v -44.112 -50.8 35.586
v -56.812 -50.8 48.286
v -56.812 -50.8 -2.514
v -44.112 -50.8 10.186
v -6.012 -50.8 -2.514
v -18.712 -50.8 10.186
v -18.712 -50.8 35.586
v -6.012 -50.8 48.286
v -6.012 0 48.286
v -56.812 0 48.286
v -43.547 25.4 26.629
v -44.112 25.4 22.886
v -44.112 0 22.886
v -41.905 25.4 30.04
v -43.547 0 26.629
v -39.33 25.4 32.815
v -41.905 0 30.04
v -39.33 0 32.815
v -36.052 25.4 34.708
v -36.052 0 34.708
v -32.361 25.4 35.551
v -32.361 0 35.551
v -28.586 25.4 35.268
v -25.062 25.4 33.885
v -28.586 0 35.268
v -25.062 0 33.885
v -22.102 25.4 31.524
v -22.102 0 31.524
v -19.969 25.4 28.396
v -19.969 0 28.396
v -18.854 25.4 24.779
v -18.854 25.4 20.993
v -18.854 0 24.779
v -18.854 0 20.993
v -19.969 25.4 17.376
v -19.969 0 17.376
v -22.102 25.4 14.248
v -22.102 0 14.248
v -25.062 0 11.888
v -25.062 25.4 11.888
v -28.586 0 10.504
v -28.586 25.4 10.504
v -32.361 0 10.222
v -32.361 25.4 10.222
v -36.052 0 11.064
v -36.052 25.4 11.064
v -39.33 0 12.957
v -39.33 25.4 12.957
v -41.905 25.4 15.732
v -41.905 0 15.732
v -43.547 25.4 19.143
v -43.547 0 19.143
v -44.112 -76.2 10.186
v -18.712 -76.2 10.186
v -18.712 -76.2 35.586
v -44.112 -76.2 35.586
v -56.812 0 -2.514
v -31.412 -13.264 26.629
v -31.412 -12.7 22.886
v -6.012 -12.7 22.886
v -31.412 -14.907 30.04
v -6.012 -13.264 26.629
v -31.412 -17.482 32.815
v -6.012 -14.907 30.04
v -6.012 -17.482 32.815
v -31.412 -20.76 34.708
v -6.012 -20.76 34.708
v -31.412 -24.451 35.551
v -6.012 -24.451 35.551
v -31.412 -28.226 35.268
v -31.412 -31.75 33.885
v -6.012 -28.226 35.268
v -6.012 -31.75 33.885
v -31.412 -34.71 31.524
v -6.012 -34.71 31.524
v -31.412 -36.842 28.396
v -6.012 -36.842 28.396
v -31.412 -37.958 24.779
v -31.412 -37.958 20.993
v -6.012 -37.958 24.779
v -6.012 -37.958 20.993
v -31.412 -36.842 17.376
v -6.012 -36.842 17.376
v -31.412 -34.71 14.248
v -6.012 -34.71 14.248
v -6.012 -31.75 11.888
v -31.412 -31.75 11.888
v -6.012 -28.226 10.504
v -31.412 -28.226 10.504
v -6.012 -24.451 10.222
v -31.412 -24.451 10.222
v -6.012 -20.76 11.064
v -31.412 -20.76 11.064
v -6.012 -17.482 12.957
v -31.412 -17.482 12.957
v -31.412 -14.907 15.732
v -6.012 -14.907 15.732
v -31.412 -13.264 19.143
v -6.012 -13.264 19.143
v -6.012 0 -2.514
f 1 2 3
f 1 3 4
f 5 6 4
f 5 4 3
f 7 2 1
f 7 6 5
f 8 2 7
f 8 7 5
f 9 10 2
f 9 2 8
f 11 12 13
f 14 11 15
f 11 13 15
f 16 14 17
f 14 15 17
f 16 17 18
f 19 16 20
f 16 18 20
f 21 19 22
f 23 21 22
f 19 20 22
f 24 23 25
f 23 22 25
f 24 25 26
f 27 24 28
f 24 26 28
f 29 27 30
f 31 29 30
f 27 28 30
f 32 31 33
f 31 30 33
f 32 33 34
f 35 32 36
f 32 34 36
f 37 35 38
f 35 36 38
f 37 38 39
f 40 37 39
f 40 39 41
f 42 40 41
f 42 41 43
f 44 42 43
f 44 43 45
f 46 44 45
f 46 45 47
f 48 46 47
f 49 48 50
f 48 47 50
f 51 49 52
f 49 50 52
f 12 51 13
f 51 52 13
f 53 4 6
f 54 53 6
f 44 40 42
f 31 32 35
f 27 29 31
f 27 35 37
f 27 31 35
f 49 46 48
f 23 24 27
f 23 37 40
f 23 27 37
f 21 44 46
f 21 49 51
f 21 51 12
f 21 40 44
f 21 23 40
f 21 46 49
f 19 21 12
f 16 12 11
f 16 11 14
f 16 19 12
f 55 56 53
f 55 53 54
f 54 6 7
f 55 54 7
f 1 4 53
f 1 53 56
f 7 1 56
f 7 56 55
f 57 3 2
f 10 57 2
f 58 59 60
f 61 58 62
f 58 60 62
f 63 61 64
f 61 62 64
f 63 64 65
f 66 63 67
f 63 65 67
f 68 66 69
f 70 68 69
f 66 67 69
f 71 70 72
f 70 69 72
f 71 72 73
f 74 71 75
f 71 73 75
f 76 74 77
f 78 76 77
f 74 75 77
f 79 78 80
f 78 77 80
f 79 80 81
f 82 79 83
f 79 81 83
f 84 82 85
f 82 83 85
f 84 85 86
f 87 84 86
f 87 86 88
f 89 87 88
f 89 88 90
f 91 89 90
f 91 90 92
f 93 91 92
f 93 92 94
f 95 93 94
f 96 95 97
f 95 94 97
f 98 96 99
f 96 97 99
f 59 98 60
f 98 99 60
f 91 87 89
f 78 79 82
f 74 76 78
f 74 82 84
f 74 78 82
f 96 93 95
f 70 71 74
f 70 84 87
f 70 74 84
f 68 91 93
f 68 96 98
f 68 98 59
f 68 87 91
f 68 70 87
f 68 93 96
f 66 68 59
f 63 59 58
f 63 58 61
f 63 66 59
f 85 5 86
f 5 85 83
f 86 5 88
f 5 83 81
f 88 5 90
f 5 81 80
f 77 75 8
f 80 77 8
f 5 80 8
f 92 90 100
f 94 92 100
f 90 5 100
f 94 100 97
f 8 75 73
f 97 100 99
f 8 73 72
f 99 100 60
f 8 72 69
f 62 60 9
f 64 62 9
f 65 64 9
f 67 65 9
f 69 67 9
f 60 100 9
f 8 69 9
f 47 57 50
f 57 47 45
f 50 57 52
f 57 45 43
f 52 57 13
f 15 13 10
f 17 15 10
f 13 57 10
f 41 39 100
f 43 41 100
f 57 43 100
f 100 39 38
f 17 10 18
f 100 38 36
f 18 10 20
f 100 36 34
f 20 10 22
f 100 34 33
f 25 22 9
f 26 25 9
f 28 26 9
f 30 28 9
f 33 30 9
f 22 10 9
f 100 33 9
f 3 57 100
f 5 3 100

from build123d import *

# Parameters (mm, degrees)
F0_W     = 50.8
F0_H     = 50.8
F1_DEPTH = 50.8
F2_W     = 25.4
F2_H     = 25.4
F3_DEPTH = 25.4
F4_R     = 12.7
F5_DEPTH = 25.4
F6_R     = 12.7
F7_DEPTH = 25.4


with BuildPart() as f1:
    # F0 (on Front) → F1 (new body)
    with BuildSketch(Plane.XZ):
        with Locations((-31.411681, 22.886025)):
            Rectangle(F0_W, F0_H)
    extrude(amount=F1_DEPTH)

    # F2 (on face) → F3 (join)
    with BuildSketch(Plane.XZ.offset(50.8)):
        with Locations((-31.411681, 22.886025)):
            Rectangle(F2_W, F2_H)
    extrude(amount=F3_DEPTH)

    # F4 (on face) → F5 (cut)
    with BuildSketch(Plane.YZ.offset(-6.011681)):
        with Locations((-25.4, 22.886025)):
            Circle(F4_R)
    extrude(amount=-F5_DEPTH, mode=Mode.SUBTRACT)

    # F6 (on face) → F7 (join)
    with BuildSketch(Plane(origin=(0, 0, 0), x_dir=(-1, 0, 0), z_dir=(0, 1, 0))):
        with Locations((31.411681, 22.886025)):
            Circle(F6_R)
    extrude(amount=F7_DEPTH)


solid = f1.part
